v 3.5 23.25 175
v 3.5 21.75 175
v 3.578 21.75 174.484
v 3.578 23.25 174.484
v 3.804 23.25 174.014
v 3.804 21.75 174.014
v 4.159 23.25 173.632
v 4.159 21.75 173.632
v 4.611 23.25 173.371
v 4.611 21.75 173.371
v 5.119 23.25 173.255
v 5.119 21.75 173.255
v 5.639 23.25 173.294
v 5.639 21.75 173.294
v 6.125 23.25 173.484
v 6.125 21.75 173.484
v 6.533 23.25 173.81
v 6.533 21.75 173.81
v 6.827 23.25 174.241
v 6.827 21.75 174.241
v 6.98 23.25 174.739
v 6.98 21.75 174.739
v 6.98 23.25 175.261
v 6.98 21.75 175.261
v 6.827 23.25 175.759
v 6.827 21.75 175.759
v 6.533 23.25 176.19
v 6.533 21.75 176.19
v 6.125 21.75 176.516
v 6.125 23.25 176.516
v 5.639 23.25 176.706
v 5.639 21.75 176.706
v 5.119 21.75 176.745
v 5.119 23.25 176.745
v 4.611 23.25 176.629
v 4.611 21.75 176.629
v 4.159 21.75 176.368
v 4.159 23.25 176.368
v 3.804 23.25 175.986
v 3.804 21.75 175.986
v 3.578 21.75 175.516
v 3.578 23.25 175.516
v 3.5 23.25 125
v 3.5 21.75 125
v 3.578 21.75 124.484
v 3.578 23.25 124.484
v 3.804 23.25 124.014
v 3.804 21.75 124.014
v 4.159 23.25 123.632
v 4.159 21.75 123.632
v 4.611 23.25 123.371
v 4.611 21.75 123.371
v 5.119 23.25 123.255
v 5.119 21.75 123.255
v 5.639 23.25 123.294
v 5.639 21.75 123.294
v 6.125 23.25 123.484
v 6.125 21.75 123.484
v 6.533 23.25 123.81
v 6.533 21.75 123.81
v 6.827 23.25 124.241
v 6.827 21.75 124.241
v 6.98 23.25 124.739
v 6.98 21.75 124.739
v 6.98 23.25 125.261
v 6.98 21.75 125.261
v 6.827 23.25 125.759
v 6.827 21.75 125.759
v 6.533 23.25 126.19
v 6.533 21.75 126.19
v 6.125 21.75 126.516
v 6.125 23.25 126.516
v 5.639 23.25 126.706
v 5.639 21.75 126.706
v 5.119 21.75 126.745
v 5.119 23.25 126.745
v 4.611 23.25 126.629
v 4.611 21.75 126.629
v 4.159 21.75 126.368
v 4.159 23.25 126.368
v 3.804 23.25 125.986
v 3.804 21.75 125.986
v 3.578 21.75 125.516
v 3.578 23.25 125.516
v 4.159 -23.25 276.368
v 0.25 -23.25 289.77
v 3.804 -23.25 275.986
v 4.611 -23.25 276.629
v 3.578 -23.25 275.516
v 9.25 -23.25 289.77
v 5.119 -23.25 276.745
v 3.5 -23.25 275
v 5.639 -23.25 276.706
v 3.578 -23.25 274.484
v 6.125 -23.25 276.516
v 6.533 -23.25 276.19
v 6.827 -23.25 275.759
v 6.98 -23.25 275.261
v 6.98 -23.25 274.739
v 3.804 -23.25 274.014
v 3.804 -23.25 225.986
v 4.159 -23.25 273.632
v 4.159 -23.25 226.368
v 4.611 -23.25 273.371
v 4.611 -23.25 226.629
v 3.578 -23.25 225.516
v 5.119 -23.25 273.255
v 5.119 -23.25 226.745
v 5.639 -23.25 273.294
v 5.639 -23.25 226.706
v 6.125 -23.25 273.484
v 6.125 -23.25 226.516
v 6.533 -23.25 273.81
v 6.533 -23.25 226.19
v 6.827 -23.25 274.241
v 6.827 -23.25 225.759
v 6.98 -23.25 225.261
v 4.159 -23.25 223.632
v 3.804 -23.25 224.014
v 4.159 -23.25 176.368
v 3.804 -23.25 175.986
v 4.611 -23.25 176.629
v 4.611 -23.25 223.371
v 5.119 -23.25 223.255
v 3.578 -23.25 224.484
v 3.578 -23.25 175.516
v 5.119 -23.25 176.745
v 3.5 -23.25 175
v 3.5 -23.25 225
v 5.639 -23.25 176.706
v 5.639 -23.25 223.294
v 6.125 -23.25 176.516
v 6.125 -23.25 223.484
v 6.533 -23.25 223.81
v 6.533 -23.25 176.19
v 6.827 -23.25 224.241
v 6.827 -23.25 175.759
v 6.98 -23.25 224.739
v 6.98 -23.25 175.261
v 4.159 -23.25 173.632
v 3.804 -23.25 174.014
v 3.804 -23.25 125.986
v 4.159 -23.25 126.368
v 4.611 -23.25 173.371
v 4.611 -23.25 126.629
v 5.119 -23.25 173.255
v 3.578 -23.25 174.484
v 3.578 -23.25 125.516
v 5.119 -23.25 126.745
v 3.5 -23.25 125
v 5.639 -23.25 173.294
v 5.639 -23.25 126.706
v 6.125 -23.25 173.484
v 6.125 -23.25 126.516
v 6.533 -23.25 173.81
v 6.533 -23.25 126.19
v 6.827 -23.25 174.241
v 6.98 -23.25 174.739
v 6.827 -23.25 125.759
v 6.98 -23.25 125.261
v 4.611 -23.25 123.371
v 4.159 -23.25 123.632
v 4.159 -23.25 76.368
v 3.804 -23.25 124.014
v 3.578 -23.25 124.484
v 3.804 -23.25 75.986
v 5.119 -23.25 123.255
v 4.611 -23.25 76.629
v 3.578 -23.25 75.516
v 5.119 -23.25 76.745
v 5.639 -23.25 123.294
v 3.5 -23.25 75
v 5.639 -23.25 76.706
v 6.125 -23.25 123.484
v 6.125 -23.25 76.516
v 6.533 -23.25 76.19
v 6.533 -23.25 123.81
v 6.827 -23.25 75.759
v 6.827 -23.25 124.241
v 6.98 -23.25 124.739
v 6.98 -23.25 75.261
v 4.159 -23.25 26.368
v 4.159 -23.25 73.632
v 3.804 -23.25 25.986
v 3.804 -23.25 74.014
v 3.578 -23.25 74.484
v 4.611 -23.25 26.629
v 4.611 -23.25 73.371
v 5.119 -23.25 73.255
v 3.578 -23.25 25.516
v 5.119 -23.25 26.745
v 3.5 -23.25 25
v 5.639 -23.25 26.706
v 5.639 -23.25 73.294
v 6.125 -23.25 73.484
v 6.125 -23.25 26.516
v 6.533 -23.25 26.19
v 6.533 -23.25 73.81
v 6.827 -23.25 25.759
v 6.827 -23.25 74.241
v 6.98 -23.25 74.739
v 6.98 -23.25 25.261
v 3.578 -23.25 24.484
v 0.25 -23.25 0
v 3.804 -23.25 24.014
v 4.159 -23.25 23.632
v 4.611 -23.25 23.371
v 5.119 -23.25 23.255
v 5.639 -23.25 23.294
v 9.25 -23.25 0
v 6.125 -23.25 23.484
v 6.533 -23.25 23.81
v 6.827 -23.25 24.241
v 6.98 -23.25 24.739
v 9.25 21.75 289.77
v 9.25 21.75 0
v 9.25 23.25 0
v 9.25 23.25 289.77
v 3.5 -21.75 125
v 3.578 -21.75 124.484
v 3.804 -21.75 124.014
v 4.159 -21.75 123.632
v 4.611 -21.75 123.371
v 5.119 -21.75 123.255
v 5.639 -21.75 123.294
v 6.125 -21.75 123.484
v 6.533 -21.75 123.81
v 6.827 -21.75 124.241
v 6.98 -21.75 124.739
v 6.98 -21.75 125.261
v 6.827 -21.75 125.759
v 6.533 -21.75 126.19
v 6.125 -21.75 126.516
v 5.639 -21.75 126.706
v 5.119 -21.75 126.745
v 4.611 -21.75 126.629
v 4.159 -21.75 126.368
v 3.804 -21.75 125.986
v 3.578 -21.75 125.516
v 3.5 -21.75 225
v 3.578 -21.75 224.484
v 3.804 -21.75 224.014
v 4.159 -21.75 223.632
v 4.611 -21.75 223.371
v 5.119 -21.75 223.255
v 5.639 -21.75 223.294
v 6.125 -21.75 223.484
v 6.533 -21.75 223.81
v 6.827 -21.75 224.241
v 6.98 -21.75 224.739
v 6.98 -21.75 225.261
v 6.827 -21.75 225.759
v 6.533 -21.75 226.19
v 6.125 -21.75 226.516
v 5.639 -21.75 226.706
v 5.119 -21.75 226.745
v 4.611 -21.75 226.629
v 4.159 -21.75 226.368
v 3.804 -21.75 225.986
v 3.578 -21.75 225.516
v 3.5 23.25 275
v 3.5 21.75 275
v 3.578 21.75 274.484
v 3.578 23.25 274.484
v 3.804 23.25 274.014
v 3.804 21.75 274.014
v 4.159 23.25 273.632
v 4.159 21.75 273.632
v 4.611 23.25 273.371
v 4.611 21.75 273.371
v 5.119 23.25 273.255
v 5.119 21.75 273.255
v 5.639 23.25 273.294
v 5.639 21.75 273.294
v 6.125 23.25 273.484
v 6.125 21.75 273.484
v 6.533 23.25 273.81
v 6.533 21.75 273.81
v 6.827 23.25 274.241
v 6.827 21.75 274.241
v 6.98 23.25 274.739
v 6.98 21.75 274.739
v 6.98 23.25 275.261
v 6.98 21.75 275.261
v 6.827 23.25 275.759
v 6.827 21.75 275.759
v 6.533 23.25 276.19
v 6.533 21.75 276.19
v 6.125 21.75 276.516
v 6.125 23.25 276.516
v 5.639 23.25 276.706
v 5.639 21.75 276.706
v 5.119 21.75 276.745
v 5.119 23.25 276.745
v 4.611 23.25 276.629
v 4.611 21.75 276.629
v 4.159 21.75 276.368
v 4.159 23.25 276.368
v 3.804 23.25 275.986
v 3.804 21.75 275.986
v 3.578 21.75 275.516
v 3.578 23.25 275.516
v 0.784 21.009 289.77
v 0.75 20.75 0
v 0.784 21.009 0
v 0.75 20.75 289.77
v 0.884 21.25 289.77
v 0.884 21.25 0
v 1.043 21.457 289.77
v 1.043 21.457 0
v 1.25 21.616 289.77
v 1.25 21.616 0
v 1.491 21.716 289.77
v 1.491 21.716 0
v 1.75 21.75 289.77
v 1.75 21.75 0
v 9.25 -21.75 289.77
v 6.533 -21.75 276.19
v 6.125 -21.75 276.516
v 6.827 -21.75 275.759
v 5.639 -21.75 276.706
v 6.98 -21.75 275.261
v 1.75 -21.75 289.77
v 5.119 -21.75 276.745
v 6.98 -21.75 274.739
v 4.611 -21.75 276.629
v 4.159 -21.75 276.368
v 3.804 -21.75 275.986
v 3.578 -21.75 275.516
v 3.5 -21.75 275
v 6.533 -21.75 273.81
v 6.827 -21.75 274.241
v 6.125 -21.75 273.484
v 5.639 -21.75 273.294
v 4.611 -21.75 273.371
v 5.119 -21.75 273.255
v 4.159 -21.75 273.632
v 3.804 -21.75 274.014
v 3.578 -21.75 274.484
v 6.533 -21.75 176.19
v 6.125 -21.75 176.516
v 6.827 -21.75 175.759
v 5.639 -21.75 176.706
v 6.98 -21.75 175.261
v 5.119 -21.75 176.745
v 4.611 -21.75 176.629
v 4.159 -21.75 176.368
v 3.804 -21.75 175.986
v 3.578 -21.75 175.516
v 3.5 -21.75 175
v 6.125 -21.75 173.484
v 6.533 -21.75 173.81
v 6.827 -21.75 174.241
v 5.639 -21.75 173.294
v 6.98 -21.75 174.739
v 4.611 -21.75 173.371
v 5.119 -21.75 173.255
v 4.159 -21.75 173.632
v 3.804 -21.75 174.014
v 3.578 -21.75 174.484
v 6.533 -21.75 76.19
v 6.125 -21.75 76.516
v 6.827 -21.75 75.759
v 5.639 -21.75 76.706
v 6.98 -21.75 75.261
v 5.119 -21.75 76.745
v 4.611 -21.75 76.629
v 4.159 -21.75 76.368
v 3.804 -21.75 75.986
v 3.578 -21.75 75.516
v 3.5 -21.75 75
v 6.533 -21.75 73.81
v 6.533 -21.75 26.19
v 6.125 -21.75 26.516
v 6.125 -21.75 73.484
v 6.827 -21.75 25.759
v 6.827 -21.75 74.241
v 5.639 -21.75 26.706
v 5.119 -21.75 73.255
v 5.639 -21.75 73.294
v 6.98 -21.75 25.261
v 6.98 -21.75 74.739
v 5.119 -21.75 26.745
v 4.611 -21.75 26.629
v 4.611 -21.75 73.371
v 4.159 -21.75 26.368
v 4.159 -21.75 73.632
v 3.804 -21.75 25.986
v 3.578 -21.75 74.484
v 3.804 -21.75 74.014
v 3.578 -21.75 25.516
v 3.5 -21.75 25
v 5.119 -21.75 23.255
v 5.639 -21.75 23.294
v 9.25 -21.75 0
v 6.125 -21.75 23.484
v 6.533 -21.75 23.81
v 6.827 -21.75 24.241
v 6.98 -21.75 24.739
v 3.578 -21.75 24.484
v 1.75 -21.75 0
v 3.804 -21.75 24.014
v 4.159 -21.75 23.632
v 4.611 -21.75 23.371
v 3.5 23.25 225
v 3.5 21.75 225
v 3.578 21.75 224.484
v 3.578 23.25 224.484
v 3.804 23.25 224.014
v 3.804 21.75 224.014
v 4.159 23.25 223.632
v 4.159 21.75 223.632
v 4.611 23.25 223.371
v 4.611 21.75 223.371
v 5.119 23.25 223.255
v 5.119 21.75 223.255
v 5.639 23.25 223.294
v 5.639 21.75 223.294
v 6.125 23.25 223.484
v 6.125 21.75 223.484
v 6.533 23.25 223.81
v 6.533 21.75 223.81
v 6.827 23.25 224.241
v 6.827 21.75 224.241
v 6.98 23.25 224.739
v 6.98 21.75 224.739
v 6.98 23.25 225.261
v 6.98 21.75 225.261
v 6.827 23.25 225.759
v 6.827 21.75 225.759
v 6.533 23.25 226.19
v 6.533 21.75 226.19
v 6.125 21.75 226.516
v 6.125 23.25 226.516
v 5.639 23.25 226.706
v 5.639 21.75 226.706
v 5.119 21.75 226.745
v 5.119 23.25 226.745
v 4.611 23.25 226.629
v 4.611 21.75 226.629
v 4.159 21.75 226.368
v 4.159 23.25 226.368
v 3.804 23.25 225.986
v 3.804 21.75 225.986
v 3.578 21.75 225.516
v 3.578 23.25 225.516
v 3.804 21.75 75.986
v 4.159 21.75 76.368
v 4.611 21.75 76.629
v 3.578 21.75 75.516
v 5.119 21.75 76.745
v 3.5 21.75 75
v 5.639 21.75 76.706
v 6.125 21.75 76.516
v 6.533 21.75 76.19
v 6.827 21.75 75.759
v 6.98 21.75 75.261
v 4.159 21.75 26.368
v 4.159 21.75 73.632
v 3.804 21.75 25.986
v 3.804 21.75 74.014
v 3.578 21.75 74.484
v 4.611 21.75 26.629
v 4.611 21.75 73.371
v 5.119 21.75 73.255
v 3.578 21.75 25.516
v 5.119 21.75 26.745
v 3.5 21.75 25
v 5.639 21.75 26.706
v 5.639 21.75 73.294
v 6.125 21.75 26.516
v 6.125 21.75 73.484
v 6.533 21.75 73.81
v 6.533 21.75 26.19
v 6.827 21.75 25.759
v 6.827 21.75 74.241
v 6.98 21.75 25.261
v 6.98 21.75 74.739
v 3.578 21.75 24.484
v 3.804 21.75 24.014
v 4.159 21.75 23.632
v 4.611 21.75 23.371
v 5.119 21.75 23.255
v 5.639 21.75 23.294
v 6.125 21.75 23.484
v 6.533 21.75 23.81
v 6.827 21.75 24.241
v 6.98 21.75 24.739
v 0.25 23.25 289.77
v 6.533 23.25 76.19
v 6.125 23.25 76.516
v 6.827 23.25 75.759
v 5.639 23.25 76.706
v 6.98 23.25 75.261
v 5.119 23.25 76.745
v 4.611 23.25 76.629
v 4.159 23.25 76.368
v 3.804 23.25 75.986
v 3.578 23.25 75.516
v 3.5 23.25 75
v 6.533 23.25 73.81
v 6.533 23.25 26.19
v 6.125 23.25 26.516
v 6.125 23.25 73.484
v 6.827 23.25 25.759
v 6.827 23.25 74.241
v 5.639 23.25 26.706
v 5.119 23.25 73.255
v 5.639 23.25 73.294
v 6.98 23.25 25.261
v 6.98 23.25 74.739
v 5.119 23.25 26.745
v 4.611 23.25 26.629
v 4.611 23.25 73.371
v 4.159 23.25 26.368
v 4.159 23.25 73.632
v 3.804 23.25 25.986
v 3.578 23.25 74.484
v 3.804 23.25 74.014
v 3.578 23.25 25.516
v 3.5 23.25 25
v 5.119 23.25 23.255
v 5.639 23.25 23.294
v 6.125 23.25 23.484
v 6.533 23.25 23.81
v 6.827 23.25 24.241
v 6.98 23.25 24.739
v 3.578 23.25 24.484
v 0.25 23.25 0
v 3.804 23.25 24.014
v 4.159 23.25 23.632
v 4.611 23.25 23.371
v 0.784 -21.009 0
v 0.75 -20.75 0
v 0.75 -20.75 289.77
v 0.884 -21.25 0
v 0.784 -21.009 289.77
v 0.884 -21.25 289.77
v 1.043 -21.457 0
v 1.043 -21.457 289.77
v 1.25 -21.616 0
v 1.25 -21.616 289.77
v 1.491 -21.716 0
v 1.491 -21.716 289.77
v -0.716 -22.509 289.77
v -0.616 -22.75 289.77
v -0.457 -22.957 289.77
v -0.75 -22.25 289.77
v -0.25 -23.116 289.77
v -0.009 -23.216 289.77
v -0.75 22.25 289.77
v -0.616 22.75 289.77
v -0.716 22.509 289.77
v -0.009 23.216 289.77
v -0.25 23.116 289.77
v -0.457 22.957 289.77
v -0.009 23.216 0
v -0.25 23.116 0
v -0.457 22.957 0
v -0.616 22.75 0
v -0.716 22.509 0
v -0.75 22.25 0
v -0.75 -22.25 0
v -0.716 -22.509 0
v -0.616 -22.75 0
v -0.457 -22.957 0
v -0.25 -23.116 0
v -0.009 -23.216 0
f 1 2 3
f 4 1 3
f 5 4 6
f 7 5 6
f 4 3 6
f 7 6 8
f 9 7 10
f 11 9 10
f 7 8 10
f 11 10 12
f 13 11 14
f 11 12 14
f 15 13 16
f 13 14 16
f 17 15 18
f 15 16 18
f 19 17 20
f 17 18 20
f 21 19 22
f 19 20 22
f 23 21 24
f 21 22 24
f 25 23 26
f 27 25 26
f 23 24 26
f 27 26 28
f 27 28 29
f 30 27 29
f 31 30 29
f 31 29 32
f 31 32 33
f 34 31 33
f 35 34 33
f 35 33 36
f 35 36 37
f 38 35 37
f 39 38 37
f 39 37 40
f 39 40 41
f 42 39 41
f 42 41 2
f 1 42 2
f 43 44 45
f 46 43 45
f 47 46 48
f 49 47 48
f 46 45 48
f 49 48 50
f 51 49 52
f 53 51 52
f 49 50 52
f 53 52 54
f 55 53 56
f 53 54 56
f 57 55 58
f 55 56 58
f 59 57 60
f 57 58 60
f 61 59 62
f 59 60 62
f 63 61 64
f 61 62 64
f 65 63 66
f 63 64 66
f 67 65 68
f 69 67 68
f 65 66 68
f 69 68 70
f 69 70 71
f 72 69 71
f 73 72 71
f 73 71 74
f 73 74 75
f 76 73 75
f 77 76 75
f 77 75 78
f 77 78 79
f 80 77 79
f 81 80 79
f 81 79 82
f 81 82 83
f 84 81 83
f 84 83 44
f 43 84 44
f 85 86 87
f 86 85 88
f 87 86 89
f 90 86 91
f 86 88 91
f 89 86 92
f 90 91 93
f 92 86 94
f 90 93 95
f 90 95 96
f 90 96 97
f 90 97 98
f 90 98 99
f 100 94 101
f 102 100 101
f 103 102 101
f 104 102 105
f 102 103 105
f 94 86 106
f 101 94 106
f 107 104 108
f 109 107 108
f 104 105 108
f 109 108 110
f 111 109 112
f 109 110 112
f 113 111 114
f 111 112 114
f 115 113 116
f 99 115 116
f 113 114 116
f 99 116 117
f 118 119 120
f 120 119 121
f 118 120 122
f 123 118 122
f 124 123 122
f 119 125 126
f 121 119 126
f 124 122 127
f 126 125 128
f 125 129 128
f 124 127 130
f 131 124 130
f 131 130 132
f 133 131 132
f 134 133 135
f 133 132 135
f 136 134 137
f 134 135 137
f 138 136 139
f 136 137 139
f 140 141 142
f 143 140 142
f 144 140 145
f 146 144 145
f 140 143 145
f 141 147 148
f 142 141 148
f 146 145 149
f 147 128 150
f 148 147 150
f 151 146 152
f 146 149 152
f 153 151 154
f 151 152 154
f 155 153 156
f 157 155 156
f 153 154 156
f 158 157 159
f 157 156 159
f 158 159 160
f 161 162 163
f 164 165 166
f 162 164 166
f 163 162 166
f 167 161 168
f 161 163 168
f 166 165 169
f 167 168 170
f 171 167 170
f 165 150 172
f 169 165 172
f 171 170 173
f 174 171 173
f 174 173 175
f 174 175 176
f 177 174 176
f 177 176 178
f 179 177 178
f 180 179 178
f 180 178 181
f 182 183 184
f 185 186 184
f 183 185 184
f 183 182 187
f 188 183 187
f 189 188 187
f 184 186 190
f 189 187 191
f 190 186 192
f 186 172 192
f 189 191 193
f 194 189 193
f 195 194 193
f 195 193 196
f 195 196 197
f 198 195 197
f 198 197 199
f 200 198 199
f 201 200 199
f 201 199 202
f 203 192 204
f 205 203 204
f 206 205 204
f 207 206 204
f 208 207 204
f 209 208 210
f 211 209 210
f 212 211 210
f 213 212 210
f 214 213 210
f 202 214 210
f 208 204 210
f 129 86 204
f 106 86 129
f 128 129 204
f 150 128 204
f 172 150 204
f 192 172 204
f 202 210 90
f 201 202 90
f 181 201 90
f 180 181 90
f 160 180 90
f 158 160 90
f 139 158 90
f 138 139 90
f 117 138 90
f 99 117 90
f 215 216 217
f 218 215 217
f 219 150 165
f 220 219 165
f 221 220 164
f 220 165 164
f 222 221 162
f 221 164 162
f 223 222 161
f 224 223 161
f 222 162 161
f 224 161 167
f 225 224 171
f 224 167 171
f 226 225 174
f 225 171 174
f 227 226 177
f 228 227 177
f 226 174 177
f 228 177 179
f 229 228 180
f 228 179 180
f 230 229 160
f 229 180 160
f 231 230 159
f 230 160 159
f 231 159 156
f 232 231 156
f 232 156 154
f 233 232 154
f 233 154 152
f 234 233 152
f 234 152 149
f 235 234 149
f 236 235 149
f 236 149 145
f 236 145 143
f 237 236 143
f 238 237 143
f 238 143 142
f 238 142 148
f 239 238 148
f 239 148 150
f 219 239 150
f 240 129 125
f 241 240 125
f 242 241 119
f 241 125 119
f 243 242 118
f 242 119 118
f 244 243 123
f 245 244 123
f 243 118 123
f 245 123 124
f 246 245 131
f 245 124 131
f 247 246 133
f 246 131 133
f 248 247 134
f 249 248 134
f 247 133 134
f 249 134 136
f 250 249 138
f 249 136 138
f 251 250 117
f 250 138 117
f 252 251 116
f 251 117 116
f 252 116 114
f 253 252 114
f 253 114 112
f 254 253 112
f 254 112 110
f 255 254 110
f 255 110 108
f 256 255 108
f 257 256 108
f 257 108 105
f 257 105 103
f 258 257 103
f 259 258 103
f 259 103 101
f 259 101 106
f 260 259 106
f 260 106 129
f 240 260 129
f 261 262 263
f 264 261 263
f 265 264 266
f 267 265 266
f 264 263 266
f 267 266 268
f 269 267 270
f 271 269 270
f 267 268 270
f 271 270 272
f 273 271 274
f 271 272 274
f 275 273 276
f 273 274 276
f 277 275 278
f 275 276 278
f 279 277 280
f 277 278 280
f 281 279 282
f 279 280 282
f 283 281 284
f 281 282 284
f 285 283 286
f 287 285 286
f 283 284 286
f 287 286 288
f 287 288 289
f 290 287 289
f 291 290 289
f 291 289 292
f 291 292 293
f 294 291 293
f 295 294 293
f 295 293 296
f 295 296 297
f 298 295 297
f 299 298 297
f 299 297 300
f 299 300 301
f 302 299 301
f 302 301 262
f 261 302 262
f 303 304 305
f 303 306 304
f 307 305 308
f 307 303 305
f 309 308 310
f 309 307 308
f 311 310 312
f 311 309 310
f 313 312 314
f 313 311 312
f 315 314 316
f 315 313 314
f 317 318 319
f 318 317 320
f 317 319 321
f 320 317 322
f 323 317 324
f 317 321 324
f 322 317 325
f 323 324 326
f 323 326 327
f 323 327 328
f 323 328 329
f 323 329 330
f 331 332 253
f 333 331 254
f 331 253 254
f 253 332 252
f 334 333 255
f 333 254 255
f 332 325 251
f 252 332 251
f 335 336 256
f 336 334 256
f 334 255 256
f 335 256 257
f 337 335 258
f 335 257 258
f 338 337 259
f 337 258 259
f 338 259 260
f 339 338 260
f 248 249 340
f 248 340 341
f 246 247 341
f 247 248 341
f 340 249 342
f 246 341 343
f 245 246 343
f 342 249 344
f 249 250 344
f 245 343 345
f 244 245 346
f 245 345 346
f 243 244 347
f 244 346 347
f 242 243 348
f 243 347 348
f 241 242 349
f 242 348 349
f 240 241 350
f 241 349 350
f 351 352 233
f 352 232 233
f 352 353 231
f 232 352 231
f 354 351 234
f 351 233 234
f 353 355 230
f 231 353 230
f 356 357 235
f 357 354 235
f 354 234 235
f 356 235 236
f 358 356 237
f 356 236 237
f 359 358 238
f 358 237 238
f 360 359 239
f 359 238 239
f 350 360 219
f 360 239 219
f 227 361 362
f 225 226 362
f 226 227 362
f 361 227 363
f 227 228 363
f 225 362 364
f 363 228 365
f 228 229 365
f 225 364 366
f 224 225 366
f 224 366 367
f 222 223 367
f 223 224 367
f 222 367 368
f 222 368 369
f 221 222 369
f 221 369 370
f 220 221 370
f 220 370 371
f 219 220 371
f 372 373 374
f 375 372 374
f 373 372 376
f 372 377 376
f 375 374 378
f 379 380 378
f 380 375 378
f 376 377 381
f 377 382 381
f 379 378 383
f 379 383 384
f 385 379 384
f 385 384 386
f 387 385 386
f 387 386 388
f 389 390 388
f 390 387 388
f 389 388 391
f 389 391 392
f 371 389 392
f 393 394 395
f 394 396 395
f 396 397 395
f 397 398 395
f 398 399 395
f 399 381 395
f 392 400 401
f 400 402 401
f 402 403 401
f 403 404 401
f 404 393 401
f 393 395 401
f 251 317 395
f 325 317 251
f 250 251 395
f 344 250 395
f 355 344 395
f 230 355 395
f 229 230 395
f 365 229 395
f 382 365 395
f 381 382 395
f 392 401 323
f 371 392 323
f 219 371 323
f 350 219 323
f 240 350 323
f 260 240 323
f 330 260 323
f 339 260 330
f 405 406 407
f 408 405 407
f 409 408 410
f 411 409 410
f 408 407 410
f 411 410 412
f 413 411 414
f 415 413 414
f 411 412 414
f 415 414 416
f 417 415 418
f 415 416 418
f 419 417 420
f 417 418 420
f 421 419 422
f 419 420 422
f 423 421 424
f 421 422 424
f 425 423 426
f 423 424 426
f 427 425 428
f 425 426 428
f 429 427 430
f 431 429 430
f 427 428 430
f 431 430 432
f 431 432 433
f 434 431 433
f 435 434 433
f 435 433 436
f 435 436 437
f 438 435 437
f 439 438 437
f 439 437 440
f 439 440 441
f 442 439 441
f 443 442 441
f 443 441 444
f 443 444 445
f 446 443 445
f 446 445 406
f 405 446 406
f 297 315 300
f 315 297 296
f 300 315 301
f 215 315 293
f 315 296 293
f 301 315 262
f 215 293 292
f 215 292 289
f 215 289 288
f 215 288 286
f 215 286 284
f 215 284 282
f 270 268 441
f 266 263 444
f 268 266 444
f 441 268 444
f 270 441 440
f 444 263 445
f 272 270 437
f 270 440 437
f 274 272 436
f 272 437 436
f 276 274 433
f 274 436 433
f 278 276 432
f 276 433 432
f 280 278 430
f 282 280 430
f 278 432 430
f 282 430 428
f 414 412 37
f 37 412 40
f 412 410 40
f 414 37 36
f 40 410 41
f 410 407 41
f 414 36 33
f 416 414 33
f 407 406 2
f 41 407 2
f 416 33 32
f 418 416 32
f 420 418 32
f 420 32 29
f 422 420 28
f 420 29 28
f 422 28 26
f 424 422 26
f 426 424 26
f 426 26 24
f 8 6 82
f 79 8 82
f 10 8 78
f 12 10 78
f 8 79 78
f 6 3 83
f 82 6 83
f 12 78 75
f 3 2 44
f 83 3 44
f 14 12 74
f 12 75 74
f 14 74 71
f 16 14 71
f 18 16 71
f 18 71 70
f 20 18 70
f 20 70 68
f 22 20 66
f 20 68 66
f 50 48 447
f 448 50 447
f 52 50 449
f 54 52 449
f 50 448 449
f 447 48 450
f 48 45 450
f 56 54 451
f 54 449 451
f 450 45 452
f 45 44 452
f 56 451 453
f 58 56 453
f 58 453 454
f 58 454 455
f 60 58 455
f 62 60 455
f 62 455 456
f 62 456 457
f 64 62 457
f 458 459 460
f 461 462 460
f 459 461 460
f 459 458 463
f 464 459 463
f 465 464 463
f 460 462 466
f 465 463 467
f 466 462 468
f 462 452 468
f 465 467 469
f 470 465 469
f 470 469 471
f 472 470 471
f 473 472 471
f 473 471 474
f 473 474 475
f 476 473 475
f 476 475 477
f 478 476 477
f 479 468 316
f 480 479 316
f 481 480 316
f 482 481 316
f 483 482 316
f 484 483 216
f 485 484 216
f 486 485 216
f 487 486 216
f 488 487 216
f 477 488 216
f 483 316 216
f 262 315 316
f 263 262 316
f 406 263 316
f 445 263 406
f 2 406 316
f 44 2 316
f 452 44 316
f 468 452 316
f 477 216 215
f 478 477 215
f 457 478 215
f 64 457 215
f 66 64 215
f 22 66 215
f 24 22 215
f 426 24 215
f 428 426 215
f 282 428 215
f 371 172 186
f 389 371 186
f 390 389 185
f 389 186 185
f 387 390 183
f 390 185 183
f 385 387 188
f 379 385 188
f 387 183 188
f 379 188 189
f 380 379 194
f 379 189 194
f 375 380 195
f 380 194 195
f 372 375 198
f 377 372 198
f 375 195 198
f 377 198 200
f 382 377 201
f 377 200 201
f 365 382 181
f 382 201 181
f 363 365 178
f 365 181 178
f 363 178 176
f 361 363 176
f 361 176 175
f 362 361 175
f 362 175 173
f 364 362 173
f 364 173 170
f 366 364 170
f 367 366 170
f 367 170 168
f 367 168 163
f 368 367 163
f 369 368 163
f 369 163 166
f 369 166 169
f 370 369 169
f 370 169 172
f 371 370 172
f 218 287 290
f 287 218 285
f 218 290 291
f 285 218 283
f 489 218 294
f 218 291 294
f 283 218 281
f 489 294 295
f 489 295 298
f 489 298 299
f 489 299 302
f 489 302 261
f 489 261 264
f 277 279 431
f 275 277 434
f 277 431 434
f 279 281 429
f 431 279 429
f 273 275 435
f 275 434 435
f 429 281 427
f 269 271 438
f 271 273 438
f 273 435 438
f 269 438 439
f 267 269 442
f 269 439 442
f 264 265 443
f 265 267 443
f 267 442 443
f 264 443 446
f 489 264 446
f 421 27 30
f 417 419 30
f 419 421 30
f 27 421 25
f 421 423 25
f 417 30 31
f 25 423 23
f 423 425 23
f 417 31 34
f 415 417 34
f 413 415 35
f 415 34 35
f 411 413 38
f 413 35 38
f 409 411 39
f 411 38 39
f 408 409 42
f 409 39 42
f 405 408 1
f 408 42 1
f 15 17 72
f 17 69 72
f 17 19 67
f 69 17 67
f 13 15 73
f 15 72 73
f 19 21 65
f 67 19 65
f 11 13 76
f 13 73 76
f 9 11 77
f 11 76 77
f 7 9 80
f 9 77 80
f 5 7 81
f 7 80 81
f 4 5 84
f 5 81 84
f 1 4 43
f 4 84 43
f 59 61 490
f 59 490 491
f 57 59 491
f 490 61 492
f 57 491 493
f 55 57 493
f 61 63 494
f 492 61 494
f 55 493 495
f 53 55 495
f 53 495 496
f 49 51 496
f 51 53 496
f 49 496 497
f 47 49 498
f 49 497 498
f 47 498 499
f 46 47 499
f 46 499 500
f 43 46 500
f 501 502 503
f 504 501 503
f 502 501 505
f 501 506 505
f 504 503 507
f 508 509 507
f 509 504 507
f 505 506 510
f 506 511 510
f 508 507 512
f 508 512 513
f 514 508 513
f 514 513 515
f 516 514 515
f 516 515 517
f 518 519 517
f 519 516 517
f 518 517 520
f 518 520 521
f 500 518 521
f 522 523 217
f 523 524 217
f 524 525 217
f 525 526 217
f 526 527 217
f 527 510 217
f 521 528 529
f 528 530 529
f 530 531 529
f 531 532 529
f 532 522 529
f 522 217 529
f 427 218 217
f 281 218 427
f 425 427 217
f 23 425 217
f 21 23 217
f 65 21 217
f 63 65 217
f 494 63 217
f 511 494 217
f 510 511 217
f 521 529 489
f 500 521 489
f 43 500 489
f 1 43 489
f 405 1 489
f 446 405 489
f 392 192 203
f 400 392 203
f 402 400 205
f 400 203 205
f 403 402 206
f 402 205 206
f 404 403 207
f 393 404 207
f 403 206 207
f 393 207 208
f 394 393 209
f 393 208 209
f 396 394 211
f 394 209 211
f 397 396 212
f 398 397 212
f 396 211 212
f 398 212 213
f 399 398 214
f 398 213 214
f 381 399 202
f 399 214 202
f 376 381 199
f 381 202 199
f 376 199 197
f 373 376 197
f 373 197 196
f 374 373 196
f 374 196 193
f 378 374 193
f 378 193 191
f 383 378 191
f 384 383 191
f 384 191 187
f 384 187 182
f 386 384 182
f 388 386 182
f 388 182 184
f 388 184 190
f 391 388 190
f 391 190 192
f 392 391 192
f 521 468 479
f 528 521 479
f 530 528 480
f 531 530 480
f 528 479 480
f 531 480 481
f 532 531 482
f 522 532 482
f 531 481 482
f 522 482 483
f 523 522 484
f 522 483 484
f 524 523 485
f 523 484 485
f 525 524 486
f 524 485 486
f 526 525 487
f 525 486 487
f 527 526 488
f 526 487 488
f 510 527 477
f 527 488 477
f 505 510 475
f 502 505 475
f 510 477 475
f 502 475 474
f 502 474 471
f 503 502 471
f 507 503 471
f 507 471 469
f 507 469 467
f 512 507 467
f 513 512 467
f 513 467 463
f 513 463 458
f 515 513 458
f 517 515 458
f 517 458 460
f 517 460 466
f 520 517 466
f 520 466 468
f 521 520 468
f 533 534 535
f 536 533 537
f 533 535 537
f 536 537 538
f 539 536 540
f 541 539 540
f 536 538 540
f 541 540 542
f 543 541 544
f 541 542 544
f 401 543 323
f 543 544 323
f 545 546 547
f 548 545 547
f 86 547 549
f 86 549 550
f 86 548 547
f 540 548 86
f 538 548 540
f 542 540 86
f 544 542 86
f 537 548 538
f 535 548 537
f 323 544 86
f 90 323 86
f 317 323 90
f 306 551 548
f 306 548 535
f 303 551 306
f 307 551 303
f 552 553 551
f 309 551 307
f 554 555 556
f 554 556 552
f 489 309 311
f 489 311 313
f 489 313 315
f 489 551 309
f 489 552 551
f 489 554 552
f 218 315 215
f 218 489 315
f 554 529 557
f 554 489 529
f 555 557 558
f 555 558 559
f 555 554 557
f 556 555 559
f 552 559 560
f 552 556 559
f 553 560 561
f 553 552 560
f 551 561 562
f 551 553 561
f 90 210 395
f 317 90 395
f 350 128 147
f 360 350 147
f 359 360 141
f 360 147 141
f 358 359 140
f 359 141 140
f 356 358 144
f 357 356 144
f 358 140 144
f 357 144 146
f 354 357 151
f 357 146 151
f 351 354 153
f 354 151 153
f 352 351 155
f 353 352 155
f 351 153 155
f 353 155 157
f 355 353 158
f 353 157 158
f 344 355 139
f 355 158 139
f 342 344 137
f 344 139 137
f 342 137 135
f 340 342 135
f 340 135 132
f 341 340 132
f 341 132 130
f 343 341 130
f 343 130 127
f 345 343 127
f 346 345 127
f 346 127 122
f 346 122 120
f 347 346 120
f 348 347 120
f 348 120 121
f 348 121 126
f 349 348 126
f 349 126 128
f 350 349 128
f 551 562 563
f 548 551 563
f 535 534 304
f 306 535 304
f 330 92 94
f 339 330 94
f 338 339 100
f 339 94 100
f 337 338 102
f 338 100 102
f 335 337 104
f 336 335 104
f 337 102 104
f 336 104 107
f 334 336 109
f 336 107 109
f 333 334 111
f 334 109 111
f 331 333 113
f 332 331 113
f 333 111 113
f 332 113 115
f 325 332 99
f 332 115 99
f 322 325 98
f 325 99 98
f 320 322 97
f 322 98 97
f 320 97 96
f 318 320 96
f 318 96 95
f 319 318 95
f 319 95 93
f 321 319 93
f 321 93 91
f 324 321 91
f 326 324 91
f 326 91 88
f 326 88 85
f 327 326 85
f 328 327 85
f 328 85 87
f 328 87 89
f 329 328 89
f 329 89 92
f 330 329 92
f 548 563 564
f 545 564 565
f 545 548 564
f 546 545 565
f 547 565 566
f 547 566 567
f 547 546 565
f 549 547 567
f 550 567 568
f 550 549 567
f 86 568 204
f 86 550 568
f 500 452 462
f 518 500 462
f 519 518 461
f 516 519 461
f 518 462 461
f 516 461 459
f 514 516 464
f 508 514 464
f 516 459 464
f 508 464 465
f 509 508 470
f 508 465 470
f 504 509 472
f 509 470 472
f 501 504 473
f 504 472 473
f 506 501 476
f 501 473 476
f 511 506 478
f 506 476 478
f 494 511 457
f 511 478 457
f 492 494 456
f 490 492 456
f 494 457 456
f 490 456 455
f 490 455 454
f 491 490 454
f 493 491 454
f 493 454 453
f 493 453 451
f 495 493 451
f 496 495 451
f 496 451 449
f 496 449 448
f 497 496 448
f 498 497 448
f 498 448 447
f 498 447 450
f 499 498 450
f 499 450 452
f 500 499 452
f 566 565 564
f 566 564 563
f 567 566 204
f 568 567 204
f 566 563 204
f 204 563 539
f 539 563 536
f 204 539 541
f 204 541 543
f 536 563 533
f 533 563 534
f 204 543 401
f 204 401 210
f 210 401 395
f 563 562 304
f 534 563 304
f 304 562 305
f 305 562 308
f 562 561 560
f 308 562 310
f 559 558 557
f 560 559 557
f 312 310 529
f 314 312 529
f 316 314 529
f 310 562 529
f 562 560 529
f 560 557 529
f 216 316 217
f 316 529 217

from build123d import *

# Parameters (mm, degrees)
SKETCH1_W           = 1.5
SKETCH1_H           = 43.5
BOSS_EXTRUDE1_DEPTH = 289.77
FILLET1_R           = 1
SKETCH3_R           = 1.75
CUT_EXTRUDE1_DEPTH  = 246.38


with BuildPart() as part:
    # Sketch1 → Boss-Extrude1 (new body)
    with BuildSketch(Plane.XY):
        Rectangle(SKETCH1_W, SKETCH1_H)
        Polygon((-0.75, 23.25), (-0.75, 21.75), (0.75, 21.75), (9.25, 21.75), (9.25, 23.25), align=None)
        Polygon((0.75, -21.75), (-0.75, -21.75), (-0.75, -23.25), (9.25, -23.25), (9.25, -21.75), align=None)
    extrude(amount=BOSS_EXTRUDE1_DEPTH)

    # Fillet1
    fillet1_edges = [part.edges().sort_by_distance(p)[0] for p in [
        (0.75, -21.75, 144.885),
        (-0.75, -23.25, 144.885),
        (-0.75, 23.25, 144.885),
        (0.75, 21.75, 144.885),
    ]]
    fillet(fillet1_edges, radius=FILLET1_R)

    # Sketch3 → Cut-Extrude1 (cut)
    with BuildSketch(Plane(origin=(0, -23.25, 0), x_dir=(-1, 0, 0), z_dir=(0, -1, 0))):
        with Locations((-5.25, -25)):
            Circle(SKETCH3_R)
        with Locations((-5.25, -75)):
            Circle(SKETCH3_R)
        with Locations((-5.25, -125)):
            Circle(SKETCH3_R)
        with Locations((-5.25, -175)):
            Circle(SKETCH3_R)
        with Locations((-5.25, -225)):
            Circle(SKETCH3_R)
        with Locations((-5.25, -275)):
            Circle(SKETCH3_R)
    extrude(amount=-CUT_EXTRUDE1_DEPTH, mode=Mode.SUBTRACT)


solid = part.part
